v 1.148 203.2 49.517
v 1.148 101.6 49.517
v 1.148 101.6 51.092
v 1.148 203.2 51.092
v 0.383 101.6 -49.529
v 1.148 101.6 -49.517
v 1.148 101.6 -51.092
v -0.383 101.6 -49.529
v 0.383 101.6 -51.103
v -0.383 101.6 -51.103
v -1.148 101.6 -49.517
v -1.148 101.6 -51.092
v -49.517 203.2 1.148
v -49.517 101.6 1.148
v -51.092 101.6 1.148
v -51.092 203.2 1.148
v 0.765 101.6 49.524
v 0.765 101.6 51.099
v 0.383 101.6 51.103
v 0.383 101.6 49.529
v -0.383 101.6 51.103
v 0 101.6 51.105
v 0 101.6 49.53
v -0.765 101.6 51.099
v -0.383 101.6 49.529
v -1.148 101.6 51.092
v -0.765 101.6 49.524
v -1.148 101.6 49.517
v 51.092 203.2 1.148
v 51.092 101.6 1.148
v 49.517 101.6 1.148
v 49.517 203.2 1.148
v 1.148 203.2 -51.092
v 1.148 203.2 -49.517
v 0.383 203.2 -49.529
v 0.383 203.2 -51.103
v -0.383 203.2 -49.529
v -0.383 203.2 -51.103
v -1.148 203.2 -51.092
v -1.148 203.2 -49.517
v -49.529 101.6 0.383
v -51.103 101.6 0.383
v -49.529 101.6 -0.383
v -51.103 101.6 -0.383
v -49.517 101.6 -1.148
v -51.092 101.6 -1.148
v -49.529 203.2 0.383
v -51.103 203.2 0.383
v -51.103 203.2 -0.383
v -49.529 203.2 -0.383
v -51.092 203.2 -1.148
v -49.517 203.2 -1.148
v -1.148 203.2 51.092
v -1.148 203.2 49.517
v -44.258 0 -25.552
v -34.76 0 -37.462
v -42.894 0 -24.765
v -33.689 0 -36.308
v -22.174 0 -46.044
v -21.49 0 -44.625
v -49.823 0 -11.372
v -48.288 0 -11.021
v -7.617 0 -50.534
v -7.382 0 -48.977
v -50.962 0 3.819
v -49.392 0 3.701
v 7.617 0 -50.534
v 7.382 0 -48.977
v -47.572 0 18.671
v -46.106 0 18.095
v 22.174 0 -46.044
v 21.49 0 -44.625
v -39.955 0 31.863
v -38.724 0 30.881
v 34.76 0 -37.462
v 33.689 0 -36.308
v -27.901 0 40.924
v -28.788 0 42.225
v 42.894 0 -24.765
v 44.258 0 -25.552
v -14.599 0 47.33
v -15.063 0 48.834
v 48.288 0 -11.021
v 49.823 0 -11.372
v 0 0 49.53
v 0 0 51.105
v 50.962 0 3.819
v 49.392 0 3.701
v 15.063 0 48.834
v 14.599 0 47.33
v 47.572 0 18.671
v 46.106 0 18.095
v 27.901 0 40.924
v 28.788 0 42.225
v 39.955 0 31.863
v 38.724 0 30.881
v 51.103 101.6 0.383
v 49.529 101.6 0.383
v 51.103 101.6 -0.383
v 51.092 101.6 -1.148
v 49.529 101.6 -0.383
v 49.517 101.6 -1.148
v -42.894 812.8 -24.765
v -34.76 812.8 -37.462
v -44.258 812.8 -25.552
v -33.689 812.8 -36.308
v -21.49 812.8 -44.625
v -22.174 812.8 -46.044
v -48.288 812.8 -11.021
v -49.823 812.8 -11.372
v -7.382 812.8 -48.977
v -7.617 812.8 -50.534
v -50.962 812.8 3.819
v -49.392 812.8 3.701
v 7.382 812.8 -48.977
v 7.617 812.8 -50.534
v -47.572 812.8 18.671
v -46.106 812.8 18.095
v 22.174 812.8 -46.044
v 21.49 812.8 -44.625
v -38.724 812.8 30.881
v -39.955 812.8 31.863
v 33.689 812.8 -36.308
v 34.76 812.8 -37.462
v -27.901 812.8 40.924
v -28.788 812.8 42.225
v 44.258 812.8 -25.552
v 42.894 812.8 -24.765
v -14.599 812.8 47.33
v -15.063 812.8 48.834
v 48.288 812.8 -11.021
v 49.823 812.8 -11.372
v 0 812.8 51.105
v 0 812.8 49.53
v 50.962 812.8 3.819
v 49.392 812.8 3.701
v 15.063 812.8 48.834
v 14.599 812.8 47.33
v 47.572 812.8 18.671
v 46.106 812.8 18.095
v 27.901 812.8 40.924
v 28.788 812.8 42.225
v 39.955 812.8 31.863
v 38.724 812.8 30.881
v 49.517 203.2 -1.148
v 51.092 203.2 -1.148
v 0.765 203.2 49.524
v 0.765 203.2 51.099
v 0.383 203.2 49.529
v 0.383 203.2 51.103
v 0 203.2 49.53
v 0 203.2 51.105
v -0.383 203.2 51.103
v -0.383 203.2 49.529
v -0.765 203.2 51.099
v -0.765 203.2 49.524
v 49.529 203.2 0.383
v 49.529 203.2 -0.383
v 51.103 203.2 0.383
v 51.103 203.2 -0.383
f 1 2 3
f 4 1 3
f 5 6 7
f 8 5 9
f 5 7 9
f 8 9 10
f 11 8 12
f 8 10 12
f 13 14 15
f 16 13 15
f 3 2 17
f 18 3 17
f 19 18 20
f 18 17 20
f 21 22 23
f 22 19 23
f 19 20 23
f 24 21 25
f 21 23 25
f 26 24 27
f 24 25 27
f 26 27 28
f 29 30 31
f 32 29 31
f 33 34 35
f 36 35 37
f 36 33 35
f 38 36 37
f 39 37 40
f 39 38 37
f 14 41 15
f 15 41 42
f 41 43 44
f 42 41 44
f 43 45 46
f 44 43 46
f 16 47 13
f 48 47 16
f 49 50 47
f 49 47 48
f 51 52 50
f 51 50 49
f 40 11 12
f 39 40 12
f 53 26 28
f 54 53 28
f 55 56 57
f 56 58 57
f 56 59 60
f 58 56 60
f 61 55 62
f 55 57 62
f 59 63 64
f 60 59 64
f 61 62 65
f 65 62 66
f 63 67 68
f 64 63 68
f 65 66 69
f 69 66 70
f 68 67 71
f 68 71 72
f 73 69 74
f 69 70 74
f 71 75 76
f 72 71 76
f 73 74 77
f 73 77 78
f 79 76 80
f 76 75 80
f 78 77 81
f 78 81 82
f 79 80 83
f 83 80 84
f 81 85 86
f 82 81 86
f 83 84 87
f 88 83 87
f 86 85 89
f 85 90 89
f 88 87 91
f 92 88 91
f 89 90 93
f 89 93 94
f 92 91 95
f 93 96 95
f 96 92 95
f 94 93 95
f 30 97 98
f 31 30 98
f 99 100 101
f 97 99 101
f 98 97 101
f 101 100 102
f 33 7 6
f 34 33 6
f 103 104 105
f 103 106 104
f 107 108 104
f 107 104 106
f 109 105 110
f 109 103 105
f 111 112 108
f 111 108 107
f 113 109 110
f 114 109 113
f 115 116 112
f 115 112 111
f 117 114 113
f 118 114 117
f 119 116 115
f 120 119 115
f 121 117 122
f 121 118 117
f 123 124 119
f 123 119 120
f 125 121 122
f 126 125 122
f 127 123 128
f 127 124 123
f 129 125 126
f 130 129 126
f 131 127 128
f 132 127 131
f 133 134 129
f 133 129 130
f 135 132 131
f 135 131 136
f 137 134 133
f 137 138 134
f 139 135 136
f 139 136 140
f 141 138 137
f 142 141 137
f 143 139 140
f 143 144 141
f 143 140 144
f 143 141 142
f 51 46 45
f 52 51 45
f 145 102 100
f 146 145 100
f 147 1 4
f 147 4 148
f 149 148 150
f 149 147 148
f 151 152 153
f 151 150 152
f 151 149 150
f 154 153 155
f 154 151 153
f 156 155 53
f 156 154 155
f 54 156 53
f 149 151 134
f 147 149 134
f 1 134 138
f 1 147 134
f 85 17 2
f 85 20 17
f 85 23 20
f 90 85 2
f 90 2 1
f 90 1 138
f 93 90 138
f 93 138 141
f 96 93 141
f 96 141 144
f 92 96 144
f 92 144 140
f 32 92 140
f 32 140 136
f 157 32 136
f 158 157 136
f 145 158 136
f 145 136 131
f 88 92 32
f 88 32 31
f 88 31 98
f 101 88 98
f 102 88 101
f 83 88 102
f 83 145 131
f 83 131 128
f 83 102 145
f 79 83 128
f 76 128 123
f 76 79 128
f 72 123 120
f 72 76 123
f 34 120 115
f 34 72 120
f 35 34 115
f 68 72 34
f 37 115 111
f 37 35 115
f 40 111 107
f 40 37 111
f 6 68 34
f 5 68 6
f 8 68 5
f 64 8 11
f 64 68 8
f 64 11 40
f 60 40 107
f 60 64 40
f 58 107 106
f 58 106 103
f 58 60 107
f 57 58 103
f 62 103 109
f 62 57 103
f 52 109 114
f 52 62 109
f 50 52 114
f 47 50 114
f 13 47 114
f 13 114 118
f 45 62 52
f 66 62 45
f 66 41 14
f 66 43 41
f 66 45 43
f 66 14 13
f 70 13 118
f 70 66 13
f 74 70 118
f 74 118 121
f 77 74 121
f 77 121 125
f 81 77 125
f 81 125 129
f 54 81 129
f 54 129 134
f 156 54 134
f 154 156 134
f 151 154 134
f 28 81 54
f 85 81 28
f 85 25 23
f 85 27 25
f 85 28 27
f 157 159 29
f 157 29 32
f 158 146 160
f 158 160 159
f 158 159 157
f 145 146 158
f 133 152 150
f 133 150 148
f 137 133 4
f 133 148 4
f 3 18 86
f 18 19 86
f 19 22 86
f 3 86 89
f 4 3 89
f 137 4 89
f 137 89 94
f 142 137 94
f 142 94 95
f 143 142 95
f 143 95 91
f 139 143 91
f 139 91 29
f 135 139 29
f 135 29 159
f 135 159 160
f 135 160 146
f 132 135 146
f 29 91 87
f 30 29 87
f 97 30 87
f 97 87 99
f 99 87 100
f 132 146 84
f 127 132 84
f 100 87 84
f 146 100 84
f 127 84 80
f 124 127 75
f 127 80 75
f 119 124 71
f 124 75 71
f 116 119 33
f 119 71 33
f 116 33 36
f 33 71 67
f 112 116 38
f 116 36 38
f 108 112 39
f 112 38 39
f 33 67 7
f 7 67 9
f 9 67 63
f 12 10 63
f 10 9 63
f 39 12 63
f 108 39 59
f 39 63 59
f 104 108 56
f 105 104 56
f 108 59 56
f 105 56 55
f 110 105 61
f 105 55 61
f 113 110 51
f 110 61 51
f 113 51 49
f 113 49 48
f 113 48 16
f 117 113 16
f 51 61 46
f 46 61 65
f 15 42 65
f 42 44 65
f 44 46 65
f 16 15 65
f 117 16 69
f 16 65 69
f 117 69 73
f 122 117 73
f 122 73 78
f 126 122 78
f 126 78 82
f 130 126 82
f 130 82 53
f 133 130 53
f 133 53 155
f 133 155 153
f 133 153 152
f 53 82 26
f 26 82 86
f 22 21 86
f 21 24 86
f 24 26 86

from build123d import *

# Parameters (mm, degrees)
SKETCH1_R           = 51.1048
SKETCH1_R_2         = 49.53
BOSS_EXTRUDE1_DEPTH = 812.8
CUT_EXTRUDE1_DEPTH  = 101.6


with BuildPart() as part:
    # Sketch1 → Boss-Extrude1 (new body)
    with BuildSketch(Plane(origin=(0, 0, 0), x_dir=(1, 0, 0), z_dir=(0, 1, 0))):
        with Locations(Location((0, 0, 0), (0, 0, 270))):
            Circle(SKETCH1_R)
        with Locations(Location((0, 0, 0), (0, 0, 270))):
            Circle(SKETCH1_R_2, mode=Mode.SUBTRACT)
    extrude(amount=BOSS_EXTRUDE1_DEPTH)

    # Sketch2 → Cut-Extrude1 (cut)
    with BuildSketch(Plane(origin=(0, 101.6, 0), x_dir=(-1, 0, 0), z_dir=(0, -1, 0))):
        with BuildLine():
            Line((-1.14808, 51.727157019), (-1.14808, 48.633812989))
            ThreePointArc((-1.14808, 48.633812989), (0, 48.647362247), (1.14808, 48.633812989))
            Line((1.14808, 48.633812989), (1.14808, 51.727157019))
            ThreePointArc((1.14808, 51.727157019), (0, 51.739896221), (-1.14808, 51.727157019))
        make_face()
        with BuildLine():
            Line((51.727157019, 1.14808), (48.633812989, 1.14808))
            ThreePointArc((48.633812989, 1.14808), (48.647362247, 0), (48.633812989, -1.14808))
            Line((48.633812989, -1.14808), (51.727157019, -1.14808))
            ThreePointArc((51.727157019, -1.14808), (51.739896221, 0), (51.727157019, 1.14808))
        make_face()
        with BuildLine():
            Line((1.14808, -51.727157019), (1.14808, -48.633812989))
            ThreePointArc((1.14808, -48.633812989), (0, -48.647362247), (-1.14808, -48.633812989))
            Line((-1.14808, -48.633812989), (-1.14808, -51.727157019))
            ThreePointArc((-1.14808, -51.727157019), (0, -51.739896221), (1.14808, -51.727157019))
        make_face()
        with BuildLine():
            Line((-51.727157019, -1.14808), (-48.633812989, -1.14808))
            ThreePointArc((-48.633812989, -1.14808), (-48.647362247, 0), (-48.633812989, 1.14808))
            Line((-48.633812989, 1.14808), (-51.727157019, 1.14808))
            ThreePointArc((-51.727157019, 1.14808), (-51.739896221, 0), (-51.727157019, -1.14808))
        make_face()
    extrude(amount=-CUT_EXTRUDE1_DEPTH, mode=Mode.SUBTRACT)


solid = part.part
